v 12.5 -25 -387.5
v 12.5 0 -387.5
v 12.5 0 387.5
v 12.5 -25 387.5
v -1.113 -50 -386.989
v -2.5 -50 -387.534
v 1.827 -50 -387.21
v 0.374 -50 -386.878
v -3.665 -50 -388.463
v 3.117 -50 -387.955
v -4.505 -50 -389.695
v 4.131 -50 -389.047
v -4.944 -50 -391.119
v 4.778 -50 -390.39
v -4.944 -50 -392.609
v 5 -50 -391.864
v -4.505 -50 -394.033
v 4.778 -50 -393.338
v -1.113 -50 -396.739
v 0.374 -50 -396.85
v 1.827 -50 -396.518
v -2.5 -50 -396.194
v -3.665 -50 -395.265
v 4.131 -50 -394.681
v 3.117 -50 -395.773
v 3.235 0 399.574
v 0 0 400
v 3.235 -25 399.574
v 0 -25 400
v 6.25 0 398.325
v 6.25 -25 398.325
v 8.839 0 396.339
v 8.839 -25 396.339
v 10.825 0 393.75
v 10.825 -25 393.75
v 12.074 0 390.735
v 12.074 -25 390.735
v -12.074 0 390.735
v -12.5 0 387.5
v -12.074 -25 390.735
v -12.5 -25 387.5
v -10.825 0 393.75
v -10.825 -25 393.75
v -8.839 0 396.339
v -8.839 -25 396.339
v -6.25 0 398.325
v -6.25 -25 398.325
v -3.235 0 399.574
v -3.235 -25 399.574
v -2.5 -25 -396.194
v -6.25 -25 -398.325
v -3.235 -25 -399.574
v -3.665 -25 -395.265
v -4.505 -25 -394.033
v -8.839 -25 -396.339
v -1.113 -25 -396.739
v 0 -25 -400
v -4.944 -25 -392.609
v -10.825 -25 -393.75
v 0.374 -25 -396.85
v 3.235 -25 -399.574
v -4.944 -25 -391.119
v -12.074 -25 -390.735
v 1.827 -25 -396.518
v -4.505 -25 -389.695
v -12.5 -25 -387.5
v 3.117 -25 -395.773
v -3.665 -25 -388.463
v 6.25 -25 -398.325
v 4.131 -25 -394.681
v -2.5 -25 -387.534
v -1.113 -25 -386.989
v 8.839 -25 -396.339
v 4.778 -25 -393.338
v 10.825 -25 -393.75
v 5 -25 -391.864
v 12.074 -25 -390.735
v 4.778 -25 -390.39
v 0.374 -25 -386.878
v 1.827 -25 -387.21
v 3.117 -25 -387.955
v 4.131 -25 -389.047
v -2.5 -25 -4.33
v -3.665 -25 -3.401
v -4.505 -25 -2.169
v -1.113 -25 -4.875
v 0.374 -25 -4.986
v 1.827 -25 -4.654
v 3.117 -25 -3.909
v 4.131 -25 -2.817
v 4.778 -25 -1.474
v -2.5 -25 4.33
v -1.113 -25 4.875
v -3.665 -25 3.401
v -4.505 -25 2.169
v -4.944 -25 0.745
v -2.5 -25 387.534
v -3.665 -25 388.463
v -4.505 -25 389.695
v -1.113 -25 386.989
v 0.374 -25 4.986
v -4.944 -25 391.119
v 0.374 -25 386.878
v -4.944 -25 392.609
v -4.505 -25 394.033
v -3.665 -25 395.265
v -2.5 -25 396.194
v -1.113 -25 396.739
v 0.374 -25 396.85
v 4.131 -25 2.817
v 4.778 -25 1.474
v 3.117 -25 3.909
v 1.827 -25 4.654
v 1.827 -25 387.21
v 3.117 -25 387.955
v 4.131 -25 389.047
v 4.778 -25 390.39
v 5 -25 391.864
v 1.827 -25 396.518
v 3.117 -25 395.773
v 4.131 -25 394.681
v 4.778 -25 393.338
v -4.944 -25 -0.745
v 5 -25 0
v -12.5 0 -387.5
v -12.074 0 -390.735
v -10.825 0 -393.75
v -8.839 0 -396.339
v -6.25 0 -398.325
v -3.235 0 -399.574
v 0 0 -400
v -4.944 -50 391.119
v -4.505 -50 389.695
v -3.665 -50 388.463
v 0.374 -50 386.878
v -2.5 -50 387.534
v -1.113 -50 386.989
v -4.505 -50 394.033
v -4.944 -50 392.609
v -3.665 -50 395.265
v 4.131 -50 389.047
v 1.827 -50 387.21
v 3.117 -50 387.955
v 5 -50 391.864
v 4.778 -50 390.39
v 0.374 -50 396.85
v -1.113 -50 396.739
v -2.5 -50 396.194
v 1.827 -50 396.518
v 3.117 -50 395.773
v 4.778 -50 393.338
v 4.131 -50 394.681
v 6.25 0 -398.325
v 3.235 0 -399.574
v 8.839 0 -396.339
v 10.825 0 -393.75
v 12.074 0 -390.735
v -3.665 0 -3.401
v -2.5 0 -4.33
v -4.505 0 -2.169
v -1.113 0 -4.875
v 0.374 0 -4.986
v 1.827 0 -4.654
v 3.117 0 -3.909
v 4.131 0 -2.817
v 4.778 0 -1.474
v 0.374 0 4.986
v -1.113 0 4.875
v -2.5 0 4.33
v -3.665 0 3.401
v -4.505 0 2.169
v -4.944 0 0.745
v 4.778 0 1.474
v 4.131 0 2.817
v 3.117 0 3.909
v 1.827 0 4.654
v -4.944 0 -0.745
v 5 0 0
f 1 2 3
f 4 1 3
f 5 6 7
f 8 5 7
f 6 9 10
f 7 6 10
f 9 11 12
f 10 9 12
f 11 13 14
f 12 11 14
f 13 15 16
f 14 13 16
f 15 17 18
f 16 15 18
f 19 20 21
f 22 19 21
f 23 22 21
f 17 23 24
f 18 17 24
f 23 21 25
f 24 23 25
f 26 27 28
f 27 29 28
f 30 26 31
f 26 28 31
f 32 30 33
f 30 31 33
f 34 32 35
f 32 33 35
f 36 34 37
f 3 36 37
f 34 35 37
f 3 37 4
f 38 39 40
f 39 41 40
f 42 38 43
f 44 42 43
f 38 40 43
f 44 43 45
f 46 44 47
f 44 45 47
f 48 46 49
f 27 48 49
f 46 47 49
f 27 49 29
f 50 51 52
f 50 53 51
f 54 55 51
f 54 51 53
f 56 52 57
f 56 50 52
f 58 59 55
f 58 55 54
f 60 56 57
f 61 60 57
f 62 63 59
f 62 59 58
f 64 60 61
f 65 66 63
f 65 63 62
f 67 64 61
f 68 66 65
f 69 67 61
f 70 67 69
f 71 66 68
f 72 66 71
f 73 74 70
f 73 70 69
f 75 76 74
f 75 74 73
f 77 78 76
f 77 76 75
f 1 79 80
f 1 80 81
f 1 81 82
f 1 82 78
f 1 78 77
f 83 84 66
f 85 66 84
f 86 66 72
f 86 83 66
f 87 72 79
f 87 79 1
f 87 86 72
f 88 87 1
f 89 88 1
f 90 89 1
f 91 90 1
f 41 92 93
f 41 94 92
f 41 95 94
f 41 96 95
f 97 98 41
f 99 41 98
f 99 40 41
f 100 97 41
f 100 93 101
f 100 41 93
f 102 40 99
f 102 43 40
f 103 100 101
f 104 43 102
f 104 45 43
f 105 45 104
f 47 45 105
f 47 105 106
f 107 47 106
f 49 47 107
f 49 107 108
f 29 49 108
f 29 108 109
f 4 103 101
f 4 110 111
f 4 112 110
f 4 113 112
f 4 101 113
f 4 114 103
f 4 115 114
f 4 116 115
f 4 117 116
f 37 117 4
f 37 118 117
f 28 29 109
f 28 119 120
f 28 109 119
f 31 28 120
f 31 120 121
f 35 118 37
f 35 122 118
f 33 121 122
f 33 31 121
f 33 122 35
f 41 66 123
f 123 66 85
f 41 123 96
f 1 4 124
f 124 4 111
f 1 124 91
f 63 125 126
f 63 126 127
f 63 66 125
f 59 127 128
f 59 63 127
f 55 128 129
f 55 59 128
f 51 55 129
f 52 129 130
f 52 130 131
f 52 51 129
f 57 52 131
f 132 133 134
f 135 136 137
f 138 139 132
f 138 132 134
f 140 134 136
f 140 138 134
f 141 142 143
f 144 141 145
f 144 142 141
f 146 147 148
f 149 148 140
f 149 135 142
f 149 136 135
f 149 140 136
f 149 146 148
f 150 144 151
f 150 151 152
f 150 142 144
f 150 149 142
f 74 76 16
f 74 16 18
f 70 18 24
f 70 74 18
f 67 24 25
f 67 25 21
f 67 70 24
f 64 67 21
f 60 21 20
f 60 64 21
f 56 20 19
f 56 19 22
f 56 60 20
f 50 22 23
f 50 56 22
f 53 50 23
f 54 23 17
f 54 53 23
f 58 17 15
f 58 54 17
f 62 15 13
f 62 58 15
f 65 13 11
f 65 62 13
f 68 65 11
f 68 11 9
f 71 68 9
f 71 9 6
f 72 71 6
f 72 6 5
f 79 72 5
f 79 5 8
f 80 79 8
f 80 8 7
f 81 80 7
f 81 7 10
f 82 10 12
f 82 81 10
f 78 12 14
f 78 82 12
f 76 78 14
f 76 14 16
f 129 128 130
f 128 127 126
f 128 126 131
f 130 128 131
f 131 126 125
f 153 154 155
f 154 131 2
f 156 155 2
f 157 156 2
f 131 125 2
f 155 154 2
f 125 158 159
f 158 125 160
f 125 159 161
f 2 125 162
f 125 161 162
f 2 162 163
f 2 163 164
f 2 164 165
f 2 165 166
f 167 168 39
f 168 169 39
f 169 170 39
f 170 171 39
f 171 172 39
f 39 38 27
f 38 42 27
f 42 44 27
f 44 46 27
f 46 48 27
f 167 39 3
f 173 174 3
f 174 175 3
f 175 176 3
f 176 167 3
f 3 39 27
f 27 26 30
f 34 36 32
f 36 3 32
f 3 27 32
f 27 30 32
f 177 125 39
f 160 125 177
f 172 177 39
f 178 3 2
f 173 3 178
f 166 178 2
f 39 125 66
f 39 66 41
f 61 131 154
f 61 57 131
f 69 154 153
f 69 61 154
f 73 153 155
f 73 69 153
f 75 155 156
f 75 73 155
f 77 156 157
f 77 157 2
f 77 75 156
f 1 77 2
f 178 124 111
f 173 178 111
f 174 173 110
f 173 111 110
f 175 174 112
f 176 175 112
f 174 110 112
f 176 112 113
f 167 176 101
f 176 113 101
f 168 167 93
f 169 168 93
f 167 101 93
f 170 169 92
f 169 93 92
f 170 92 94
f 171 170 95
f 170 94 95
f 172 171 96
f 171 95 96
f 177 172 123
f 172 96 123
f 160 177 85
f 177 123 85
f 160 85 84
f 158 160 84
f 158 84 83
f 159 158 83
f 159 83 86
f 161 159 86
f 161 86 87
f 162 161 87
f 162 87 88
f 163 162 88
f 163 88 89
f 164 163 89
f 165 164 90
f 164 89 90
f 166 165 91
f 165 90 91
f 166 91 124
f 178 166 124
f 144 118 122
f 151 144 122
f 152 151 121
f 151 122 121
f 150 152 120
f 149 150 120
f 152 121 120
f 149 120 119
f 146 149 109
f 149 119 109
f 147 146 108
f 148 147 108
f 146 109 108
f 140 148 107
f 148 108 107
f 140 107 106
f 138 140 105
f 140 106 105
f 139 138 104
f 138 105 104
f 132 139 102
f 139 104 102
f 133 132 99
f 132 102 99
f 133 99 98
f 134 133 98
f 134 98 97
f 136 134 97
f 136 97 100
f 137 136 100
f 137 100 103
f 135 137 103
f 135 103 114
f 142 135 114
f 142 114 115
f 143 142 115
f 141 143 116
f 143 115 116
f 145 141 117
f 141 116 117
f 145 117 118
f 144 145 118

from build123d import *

# Parameters (mm, degrees)
F0_W     = 25
F0_H     = 800
F1_DEPTH = 25
F2_R     = 5
F3_DEPTH = 25
F4_R     = 5
F5_DEPTH = 25
F6_R     = 12.49999
F7_R     = 12.49999


# Not quite as in the source:
# - a fillet or chamfer is up to 0.001 mm smaller than in the source, because OpenCascade refuses the exact size
# - a pattern or mirror of a feature is missing from the dataset's text; its kind, count and spacing are read off the source's solid


with BuildPart() as f1:
    # F0 (on Front) → F1 (new body)
    with BuildSketch(Plane.XZ):
        Rectangle(F0_W, F0_H)
    extrude(amount=F1_DEPTH)

    # F2 (on face) → F3 (join)
    with BuildSketch(Plane.XZ.offset(25)):
        with Locations((0, 391.8639719486)):
            Circle(F2_R)
    f3 = extrude(amount=F3_DEPTH)

    # F3_copies: F3 across plane
    add(f3.mirror(Plane(origin=(0, 0, 0), x_dir=(-1, 0, 0), z_dir=(0, 0, -1))))

    # F4 (on face) → F5 (cut)
    with BuildSketch(Plane.XZ.offset(25)):
        Circle(F4_R)
    extrude(amount=-F5_DEPTH, mode=Mode.SUBTRACT)

    # F6 (radius 12.5 in the source; OpenCascade refuses exactly that, so slightly less here)
    f6_edges = [f1.edges().sort_by_distance(p)[0] for p in [
        (-12.5, -12.5, 400),
        (12.5, -12.5, 400),
    ]]
    fillet(f6_edges, radius=F6_R)

    # F7 (radius 12.5 in the source; OpenCascade refuses exactly that, so slightly less here)
    f7_edges = [f1.edges().sort_by_distance(p)[0] for p in [
        (12.5, -12.5, -400),
        (-12.5, -12.5, -400),
    ]]
    fillet(f7_edges, radius=F7_R)


solid = f1.part
